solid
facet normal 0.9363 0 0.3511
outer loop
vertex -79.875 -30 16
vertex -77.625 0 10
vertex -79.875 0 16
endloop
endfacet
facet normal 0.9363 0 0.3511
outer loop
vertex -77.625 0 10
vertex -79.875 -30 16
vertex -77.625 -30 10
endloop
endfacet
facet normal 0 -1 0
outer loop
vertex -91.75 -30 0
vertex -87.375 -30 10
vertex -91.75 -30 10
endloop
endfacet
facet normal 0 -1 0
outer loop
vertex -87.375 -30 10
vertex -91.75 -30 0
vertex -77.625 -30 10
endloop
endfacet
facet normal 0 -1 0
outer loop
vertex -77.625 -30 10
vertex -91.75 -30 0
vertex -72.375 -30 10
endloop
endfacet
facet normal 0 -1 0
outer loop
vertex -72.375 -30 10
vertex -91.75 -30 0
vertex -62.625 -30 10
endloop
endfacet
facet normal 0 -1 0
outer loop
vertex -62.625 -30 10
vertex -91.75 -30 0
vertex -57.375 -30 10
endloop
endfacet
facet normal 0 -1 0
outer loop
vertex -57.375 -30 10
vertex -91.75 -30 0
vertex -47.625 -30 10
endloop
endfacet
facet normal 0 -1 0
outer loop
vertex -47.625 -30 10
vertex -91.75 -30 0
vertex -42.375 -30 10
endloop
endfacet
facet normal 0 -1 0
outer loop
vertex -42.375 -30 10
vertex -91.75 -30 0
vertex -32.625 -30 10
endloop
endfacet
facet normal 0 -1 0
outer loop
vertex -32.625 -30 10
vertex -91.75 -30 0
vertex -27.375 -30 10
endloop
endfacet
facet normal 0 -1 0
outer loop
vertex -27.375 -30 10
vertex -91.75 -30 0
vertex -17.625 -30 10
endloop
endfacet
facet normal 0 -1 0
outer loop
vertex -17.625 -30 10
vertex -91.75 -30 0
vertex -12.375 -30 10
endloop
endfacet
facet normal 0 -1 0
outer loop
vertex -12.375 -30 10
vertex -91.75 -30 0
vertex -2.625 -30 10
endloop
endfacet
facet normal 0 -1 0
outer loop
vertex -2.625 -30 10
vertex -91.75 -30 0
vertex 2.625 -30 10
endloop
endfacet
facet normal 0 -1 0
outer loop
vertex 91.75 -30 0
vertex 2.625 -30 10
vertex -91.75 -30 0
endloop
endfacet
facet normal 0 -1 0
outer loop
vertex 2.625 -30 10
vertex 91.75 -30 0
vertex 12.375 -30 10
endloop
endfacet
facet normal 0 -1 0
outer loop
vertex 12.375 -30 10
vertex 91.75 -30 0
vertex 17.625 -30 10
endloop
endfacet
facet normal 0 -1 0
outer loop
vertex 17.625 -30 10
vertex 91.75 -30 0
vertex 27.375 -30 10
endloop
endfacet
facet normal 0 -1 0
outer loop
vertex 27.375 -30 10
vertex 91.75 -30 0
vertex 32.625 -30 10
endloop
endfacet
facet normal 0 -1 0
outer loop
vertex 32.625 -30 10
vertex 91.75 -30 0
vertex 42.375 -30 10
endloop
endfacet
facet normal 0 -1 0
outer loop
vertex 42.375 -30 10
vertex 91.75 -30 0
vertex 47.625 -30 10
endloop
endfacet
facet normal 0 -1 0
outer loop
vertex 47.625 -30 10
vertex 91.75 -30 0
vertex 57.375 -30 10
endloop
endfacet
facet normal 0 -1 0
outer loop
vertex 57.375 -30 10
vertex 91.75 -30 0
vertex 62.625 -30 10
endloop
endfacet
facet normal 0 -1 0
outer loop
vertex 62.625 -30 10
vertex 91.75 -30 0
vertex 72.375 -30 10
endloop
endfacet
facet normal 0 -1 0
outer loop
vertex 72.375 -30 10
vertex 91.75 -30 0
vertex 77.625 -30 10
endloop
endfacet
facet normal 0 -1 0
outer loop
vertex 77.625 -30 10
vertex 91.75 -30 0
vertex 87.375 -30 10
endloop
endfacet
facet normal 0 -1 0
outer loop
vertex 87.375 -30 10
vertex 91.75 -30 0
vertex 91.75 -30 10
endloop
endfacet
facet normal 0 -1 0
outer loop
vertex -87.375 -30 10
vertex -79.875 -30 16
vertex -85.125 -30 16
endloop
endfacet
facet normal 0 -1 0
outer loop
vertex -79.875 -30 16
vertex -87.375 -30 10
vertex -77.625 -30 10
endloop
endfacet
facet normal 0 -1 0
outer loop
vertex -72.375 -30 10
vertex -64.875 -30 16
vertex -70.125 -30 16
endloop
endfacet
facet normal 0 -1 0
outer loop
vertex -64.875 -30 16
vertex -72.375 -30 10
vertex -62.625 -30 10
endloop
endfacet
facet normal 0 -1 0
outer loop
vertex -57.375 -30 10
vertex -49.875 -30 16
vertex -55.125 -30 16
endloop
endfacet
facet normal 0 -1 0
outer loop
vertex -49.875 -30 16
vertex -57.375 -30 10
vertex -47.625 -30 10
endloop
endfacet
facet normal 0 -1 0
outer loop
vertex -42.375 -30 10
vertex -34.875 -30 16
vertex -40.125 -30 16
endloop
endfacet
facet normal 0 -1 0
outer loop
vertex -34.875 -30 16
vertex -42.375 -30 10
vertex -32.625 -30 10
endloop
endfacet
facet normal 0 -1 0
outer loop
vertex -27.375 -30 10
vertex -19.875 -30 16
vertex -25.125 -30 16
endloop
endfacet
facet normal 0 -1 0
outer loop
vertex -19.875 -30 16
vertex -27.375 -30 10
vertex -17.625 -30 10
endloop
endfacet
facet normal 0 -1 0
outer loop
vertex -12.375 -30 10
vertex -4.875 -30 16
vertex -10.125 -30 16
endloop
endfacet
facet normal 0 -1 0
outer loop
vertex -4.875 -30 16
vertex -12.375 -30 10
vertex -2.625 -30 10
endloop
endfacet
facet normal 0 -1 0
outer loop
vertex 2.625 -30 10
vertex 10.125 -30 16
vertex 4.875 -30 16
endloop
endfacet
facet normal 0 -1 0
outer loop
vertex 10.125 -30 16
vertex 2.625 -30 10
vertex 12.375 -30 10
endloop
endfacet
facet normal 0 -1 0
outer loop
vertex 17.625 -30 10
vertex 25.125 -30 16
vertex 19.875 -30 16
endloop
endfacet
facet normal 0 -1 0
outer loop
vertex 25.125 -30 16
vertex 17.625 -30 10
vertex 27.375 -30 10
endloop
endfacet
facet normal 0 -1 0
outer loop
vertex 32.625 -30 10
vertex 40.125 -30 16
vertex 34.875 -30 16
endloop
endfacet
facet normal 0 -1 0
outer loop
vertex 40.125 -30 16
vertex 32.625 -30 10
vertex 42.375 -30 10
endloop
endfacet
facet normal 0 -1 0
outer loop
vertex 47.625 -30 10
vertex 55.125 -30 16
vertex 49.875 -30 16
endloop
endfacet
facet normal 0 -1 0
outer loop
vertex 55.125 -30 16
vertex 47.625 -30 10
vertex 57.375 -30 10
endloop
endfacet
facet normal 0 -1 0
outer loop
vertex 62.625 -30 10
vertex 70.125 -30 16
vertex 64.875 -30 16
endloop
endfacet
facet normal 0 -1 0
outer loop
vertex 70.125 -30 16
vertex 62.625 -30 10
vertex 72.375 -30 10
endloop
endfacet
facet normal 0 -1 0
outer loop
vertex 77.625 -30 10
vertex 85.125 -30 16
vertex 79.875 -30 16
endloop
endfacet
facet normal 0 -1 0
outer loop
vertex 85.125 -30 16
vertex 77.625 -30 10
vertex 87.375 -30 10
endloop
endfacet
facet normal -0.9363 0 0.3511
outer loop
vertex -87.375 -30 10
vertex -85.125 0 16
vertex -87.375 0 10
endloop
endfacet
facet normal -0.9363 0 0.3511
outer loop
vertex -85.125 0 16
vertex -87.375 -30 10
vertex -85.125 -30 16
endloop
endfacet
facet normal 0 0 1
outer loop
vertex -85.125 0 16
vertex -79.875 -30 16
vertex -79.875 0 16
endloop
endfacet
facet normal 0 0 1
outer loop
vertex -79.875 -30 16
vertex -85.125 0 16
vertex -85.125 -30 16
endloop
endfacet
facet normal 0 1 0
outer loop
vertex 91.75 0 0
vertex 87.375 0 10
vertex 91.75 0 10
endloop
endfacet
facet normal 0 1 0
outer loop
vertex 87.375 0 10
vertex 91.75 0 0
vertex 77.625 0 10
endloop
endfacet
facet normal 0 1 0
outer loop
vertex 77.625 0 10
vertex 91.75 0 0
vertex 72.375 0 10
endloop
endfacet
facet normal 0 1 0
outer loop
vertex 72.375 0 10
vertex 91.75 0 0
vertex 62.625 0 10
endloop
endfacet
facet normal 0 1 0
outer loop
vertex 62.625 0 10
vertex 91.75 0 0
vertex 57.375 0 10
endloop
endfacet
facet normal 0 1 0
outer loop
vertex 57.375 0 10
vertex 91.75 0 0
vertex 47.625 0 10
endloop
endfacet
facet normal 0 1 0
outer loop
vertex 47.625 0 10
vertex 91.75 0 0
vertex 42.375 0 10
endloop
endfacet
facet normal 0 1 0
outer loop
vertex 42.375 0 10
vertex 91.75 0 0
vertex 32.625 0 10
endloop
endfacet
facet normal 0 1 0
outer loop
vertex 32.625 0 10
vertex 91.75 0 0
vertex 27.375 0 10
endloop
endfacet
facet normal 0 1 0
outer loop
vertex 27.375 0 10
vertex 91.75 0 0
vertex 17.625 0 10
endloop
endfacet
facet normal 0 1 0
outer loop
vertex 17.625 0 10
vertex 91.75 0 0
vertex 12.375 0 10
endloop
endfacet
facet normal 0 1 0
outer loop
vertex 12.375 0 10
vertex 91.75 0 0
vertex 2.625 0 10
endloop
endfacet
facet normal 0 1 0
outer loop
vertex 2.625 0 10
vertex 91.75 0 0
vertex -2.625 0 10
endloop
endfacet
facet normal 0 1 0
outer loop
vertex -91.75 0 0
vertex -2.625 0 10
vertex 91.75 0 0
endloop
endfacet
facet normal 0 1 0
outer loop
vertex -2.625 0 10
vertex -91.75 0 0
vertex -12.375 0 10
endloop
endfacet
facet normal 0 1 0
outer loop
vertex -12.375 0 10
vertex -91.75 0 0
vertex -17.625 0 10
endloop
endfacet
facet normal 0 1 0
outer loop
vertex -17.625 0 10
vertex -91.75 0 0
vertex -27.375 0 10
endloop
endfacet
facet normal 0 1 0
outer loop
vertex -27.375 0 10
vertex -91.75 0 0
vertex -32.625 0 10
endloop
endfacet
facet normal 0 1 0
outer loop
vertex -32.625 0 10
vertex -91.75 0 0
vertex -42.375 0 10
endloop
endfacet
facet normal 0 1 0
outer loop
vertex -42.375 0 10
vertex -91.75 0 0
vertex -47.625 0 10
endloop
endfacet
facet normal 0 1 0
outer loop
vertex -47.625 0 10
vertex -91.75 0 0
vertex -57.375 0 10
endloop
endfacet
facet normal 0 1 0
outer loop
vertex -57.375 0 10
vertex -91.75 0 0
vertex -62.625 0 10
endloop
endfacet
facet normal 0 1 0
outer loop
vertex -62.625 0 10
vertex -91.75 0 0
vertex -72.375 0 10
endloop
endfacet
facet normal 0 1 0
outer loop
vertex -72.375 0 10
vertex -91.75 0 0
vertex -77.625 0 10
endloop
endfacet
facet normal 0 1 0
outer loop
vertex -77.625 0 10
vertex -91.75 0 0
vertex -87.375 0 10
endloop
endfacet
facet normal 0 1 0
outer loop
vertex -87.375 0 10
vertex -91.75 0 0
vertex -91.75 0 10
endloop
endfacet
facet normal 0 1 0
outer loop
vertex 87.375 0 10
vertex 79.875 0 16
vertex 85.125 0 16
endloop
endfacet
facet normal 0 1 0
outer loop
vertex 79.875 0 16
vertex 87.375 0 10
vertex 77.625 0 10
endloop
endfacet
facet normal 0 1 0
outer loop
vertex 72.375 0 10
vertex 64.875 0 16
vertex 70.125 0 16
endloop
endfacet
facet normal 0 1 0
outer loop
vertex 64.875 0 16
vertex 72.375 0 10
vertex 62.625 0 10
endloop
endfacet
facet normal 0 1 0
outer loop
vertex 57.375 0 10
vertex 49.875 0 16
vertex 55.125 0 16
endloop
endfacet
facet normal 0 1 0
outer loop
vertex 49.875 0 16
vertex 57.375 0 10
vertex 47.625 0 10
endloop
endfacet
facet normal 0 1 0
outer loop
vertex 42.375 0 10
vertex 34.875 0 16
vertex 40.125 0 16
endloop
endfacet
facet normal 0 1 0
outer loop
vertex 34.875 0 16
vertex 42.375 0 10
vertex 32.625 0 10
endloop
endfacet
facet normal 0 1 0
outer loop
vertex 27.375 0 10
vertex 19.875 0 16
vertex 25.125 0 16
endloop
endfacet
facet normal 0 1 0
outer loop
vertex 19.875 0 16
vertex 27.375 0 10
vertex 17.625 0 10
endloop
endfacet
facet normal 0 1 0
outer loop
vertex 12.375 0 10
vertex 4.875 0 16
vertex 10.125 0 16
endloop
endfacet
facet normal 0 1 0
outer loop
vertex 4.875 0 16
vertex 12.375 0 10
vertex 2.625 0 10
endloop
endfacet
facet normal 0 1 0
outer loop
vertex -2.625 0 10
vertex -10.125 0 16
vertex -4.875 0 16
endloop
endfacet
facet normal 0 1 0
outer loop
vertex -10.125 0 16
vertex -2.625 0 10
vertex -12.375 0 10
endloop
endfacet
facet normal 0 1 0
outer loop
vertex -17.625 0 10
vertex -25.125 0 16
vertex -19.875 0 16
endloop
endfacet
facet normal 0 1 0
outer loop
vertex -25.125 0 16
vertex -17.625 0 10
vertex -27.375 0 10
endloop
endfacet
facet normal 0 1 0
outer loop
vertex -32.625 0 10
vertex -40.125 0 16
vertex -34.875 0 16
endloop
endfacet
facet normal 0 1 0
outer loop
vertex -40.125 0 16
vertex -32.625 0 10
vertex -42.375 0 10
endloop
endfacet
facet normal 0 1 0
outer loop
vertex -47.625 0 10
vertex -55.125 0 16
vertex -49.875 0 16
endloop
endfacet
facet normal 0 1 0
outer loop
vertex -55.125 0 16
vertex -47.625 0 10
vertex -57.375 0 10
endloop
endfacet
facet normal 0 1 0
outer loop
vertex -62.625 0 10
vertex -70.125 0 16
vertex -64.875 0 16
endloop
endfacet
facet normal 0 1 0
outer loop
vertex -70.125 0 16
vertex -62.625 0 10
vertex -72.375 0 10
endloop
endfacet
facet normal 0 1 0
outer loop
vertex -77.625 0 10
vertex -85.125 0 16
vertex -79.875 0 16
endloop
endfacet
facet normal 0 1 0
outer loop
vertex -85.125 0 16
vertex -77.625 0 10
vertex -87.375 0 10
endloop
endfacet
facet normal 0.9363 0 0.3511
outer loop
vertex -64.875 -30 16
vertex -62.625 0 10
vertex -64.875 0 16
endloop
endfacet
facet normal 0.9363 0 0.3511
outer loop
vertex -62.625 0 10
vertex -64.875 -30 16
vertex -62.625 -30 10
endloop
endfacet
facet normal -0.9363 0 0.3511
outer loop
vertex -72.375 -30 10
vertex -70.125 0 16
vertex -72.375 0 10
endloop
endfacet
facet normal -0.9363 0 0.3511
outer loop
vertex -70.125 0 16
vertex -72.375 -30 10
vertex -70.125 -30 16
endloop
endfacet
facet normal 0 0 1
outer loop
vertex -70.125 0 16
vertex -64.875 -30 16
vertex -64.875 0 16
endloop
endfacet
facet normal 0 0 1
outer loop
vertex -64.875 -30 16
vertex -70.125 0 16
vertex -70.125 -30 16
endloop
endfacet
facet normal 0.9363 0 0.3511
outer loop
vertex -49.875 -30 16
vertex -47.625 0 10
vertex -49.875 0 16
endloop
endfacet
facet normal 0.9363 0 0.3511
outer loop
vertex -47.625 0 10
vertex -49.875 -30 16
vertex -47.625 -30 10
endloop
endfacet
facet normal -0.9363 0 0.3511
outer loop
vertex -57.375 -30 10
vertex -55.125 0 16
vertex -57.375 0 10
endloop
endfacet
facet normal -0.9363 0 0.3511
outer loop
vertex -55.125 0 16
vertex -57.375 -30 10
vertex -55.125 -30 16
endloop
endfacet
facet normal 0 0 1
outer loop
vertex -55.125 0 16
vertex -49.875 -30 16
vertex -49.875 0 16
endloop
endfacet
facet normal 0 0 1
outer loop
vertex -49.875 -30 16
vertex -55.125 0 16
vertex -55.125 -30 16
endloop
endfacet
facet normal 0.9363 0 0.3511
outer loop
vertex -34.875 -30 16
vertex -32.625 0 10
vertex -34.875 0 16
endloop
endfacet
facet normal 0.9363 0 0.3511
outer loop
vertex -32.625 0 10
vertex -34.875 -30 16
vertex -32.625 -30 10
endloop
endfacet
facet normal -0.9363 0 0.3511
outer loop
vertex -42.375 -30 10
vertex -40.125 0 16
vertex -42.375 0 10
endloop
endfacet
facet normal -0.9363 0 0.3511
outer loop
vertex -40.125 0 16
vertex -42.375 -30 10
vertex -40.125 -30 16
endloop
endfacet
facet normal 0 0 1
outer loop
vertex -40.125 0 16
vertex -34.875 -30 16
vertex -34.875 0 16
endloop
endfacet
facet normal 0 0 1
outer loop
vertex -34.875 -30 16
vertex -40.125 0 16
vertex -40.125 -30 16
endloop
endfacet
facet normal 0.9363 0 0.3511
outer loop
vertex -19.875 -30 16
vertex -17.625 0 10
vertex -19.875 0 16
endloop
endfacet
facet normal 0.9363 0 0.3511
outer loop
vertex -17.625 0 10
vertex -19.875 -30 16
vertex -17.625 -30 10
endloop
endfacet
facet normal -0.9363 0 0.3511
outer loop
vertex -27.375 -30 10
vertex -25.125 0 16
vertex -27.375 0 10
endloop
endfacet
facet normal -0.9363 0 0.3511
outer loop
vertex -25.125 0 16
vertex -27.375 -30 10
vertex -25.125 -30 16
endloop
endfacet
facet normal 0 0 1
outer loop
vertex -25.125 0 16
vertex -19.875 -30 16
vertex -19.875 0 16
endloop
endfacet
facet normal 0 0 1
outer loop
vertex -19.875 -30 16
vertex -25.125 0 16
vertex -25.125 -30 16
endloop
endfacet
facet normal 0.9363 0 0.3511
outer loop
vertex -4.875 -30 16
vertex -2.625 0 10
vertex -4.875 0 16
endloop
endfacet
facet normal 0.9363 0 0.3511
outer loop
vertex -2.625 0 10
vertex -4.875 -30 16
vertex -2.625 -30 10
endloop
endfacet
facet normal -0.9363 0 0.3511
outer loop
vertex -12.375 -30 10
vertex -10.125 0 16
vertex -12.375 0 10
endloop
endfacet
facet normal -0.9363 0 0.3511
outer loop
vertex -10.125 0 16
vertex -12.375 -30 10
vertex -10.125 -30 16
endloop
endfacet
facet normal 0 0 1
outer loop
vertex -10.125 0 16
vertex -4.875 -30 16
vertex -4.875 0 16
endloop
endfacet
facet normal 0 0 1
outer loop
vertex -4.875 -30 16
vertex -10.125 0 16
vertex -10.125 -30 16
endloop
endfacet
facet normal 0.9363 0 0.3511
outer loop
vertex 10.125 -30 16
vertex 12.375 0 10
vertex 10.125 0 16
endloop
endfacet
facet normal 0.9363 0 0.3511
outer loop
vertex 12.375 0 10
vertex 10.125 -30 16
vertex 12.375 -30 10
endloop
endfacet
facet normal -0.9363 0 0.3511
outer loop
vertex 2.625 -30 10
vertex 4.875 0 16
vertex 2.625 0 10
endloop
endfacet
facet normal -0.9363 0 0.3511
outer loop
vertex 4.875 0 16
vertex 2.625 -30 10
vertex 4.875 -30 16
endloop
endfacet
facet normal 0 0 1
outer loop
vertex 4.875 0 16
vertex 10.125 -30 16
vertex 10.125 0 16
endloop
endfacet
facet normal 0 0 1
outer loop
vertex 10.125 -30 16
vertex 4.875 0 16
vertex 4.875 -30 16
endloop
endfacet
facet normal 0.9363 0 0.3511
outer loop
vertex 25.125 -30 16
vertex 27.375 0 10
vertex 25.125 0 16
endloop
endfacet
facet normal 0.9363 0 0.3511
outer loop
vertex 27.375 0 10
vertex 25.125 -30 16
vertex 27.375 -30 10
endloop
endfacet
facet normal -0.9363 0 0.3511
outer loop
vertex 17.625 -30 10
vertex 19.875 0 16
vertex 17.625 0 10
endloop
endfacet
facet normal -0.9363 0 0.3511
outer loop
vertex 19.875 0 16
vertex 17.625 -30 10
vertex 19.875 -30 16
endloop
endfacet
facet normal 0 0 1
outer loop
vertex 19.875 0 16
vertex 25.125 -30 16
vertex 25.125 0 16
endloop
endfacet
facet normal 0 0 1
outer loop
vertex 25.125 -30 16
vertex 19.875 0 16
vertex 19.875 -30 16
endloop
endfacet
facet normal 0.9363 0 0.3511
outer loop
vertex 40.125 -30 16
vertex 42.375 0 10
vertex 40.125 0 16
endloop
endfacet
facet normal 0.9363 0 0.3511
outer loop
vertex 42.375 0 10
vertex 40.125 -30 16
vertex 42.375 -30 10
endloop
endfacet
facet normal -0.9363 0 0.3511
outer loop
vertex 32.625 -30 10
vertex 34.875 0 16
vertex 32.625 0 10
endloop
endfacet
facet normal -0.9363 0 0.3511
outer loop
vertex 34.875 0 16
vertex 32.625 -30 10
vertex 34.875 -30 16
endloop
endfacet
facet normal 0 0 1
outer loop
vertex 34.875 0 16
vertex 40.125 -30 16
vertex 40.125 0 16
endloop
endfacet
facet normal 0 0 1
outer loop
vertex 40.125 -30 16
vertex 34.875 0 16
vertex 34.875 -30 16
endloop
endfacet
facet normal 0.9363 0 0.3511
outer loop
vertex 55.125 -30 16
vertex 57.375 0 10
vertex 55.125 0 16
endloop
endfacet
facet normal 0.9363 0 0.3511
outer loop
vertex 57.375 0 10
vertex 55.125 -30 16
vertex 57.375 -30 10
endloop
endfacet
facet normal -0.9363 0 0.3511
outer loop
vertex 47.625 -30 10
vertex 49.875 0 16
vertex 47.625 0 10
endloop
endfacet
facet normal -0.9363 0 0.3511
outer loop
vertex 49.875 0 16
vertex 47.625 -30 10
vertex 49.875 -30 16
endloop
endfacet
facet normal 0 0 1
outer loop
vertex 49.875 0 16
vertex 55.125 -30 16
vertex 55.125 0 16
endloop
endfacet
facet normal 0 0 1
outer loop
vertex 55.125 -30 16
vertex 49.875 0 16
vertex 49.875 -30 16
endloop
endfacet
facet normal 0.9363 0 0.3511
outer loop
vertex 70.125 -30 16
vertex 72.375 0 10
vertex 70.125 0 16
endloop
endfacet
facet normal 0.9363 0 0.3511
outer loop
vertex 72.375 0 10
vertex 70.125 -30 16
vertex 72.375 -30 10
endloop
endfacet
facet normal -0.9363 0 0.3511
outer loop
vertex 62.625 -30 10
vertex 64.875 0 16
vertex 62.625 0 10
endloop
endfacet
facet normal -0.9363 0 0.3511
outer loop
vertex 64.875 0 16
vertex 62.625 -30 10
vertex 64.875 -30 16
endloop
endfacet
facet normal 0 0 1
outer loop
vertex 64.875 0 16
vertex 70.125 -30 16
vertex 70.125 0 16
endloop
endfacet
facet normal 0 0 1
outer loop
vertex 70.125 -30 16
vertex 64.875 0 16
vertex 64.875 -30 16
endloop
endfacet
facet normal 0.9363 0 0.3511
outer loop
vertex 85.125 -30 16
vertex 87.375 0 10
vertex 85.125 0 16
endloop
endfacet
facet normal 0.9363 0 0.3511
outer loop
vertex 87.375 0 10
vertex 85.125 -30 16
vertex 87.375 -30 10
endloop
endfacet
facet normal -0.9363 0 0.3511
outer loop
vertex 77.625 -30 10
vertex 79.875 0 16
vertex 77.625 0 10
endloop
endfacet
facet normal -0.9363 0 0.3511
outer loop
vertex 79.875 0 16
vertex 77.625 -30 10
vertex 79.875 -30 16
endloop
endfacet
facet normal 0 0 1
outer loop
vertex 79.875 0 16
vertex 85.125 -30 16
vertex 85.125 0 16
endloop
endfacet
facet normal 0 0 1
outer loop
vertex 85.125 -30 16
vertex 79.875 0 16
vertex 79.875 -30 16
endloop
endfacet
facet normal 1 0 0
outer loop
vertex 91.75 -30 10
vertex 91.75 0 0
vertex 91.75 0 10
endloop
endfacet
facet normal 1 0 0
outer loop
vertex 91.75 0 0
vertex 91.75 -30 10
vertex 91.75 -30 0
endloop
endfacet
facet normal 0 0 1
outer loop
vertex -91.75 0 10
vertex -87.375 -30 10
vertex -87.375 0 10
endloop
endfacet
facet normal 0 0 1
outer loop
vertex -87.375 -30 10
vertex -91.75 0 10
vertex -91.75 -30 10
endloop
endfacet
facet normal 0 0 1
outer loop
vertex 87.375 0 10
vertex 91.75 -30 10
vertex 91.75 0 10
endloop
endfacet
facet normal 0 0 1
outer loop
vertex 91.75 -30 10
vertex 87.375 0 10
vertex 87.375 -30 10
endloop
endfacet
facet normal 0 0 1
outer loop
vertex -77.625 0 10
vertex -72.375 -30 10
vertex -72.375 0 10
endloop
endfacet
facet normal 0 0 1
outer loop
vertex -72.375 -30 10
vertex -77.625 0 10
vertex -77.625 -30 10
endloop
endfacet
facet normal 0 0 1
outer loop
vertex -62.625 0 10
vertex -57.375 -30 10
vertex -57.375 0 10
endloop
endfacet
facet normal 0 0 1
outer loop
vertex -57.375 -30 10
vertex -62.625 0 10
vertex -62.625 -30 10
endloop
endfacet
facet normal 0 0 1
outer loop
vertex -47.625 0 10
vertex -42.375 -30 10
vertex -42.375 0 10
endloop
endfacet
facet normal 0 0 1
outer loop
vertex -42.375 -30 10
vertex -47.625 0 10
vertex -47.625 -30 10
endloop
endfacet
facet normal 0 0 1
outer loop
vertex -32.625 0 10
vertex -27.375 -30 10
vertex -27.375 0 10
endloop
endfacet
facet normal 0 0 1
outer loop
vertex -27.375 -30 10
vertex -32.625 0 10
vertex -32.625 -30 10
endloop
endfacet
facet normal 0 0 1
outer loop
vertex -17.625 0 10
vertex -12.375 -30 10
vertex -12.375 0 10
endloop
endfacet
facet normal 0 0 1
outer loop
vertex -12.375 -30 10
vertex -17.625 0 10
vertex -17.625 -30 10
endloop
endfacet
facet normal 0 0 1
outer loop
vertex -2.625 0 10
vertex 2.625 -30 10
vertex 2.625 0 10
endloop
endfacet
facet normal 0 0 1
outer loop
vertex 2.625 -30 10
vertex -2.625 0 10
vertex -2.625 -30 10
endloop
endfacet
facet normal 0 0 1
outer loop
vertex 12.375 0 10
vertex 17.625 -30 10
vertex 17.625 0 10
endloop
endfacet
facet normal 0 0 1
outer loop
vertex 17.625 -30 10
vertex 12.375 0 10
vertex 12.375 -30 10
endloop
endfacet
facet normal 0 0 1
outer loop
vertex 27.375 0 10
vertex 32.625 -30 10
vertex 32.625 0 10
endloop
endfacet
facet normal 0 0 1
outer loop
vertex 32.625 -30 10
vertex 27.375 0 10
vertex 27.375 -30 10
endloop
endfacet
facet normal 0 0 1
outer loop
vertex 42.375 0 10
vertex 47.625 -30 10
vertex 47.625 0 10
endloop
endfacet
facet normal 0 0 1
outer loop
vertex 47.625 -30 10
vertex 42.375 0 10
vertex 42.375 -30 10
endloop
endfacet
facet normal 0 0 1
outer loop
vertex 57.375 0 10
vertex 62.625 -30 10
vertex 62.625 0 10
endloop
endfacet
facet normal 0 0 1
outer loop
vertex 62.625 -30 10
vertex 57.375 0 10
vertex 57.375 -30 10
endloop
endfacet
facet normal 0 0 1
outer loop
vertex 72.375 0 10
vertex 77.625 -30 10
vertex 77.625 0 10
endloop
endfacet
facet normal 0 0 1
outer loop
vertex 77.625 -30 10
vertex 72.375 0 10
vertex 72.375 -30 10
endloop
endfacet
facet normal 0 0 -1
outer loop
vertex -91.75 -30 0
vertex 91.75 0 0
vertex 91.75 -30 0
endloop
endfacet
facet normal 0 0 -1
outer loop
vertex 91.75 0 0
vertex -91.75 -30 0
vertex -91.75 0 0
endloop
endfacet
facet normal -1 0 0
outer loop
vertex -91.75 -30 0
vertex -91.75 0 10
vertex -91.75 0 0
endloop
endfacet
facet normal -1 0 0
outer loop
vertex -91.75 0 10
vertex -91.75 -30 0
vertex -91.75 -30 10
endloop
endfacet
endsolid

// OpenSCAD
$fn = 32;

// ----------------------------------------------------------------------
// Toothed rack, 12 teeth
// 15 mm pitch, 6 mm teeth
// ----------------------------------------------------------------------

// --- parameters (mm) ---
bar_w = 30;      // bar width (Y)
bar_h = 10;      // bar height (Z)
teeth = 12;      // number of teeth
pitch = 15;      // tooth pitch
tooth_h = 6;     // tooth height above the bar
root_w = 10.5;   // tooth width at the root
crest_w = 5.25;  // tooth width at the crest

// --- derived feature positions (mm) ---
span = (teeth - 1) * pitch;  // = 165   distance between the outer teeth
bar_l = span + root_w + 8;   // = 183.5   bar length: teeth plus 4 mm at each end
tooth_x = -span / 2;         // = -82.5   X of the first tooth
height = bar_h + tooth_h;    // = 16   overall height
feature_centers = [
  [tooth_x + 0 * pitch, -bar_w / 2],
  [tooth_x + 1 * pitch, -bar_w / 2],
  [tooth_x + 2 * pitch, -bar_w / 2],
  [tooth_x + 3 * pitch, -bar_w / 2],
  [tooth_x + 4 * pitch, -bar_w / 2],
  [tooth_x + 5 * pitch, -bar_w / 2],
  [tooth_x + 6 * pitch, -bar_w / 2],
  [tooth_x + 7 * pitch, -bar_w / 2],
  [tooth_x + 8 * pitch, -bar_w / 2],
  [tooth_x + 9 * pitch, -bar_w / 2],
  [tooth_x + 10 * pitch, -bar_w / 2],
  [tooth_x + 11 * pitch, -bar_w / 2]
];   // tooth centre line, drives the tooth loop

// bar with a rack of teeth, one extruded trapezoium per centre
module rack_tooth() {
  linear_extrude(height = bar_w)
    polygon(points = [
      [0, 0],
      [root_w, 0],
      [root_w / 2 + crest_w / 2, tooth_h + 1],
      [root_w / 2 - crest_w / 2, tooth_h + 1]
    ]);
}

union() {
  translate([-bar_l / 2, -bar_w, 0]) cube([bar_l, bar_w, bar_h]);
  for (centre = feature_centers)
    translate([centre[0] - root_w / 2, 0, bar_h - 1]) rotate([90, 0, 0]) rack_tooth();
}
